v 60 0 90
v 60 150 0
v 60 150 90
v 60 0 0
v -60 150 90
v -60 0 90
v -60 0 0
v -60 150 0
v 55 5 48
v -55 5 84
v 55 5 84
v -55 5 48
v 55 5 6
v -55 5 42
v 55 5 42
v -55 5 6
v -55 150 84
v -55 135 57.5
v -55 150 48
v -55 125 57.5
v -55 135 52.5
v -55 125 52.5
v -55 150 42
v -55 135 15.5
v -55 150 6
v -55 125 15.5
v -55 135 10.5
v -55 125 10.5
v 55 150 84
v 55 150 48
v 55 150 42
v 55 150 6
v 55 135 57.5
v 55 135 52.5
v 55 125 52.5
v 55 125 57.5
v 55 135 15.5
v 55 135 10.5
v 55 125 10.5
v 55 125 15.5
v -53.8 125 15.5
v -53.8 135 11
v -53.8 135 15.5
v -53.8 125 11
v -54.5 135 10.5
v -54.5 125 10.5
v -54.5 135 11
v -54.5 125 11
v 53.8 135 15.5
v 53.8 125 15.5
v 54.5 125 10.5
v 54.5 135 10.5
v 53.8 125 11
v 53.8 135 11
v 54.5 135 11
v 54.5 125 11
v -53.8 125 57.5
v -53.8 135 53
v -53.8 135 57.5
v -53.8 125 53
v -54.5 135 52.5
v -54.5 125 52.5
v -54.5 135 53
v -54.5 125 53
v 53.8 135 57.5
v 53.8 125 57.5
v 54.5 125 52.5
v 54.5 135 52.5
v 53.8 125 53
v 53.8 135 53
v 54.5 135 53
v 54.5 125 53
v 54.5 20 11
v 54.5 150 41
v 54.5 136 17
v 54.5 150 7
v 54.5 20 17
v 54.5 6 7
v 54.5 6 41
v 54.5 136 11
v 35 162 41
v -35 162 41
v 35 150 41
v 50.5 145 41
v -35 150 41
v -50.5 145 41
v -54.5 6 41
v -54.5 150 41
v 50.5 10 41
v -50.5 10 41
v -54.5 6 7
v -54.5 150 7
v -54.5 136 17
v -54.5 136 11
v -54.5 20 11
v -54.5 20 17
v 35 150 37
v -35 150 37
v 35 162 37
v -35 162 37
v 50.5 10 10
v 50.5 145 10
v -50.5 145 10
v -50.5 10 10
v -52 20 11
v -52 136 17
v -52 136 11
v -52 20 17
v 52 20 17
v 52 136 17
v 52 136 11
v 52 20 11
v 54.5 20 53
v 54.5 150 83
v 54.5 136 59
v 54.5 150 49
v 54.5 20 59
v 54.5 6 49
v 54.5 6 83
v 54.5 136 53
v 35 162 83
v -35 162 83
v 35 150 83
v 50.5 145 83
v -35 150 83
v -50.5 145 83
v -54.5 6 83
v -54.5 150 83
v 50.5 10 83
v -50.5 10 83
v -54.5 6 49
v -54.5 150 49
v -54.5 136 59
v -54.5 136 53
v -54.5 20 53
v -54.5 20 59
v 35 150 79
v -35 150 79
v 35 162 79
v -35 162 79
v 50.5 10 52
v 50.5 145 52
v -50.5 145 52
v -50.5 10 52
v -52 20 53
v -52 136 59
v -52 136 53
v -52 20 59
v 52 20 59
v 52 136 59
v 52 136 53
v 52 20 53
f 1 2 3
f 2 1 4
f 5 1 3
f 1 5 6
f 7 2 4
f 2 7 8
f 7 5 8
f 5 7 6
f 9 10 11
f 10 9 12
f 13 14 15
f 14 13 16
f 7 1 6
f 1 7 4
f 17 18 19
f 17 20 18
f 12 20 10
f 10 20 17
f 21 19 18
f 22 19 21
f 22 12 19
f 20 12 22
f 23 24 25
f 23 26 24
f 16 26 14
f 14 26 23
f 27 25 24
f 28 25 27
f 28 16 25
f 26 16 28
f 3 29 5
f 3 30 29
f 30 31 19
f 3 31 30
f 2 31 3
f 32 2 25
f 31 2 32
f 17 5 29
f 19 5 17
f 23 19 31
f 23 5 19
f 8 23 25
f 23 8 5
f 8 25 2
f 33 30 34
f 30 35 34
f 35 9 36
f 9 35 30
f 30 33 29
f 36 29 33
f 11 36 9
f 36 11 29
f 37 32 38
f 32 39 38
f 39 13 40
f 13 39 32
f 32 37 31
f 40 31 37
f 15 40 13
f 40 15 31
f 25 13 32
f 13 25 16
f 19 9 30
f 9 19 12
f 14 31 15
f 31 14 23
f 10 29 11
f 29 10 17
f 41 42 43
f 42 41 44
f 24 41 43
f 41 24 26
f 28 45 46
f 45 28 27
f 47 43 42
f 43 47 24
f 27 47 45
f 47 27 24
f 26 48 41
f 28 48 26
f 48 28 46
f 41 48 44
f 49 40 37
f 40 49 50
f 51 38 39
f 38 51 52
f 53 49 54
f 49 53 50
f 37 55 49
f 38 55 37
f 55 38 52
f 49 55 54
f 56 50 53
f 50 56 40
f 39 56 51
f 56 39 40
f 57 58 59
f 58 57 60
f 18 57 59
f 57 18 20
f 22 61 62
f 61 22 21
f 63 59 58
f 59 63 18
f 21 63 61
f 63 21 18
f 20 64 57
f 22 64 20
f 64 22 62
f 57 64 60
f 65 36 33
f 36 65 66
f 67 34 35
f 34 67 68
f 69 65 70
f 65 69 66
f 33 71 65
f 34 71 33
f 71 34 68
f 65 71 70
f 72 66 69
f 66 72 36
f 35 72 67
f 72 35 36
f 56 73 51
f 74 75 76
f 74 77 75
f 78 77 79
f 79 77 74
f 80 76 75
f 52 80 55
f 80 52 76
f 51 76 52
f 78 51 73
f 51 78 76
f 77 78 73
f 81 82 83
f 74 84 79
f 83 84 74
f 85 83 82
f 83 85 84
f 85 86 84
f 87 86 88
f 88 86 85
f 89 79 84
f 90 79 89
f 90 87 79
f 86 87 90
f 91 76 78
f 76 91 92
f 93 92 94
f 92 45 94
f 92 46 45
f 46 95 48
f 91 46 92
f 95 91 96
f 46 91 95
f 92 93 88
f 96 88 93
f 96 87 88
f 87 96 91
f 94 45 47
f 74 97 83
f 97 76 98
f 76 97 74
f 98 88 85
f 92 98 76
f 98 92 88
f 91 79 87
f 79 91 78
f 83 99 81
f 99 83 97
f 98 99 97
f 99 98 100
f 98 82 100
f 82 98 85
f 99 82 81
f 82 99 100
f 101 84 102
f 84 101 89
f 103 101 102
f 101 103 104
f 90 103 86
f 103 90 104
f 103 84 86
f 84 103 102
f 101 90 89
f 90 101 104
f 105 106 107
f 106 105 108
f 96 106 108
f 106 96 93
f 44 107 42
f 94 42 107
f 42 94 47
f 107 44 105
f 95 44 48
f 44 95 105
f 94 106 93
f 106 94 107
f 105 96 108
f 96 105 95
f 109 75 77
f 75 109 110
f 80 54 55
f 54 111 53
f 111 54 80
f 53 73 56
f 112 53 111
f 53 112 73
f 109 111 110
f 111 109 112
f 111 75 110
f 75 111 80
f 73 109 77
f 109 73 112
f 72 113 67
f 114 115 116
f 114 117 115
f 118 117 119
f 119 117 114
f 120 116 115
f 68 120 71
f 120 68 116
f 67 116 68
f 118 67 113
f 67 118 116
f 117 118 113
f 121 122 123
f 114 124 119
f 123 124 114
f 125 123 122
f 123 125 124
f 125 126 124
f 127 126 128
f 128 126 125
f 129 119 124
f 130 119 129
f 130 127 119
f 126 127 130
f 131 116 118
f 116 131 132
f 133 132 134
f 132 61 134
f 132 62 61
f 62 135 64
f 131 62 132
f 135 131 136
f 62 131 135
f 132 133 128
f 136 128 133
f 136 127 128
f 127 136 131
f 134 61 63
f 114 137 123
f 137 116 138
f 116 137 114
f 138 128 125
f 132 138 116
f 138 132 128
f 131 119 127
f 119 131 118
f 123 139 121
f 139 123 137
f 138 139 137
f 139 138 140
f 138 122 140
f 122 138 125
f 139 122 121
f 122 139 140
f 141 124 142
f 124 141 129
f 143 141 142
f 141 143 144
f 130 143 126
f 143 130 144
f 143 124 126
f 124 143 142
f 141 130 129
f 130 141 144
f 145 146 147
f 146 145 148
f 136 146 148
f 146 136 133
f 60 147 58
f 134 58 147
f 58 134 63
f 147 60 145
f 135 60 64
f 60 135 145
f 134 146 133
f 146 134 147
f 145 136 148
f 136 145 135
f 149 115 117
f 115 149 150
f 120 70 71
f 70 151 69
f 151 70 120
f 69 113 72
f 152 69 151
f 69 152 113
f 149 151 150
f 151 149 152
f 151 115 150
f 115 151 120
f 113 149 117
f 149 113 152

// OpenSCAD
part = "assembly"; // [assembly:Assembly, frame:Frame, drawer:Drawer]
cadverify_only = "";
module instance(name, part, unit = 1) {
    echo(cadverify_instance = [name, part, unit]);
    if (cadverify_only == "" || cadverify_only == name) children();
}
// frame assembly coords: X -60..60, Y 0..150, Z 0..90
module frame_asm() {
    union() {
        translate([-60,0,0]) cube([120,5,90]);
        translate([-60,0,0]) cube([5,150,90]);
        translate([55,0,0]) cube([5,150,90]);
        translate([-55,5,0]) cube([110,145,6]);
        translate([-55,5,42]) cube([110,145,6]);
        translate([-55,5,84]) cube([110,145,6]);
        translate([-55,125,10.5]) cube([1.2,10,5]);
        translate([53.8,125,10.5]) cube([1.2,10,5]);
        translate([-55,125,52.5]) cube([1.2,10,5]);
        translate([53.8,125,52.5]) cube([1.2,10,5]);
    }
}
module frame_print() {
    translate([0,90,0]) rotate([90,0,0]) frame_asm();
}
// drawer part coords: X -54.5..54.5, Y 0..144 body + handle to 156, Z 0..34
module drawer_raw() {
    difference() {
        union() {
            translate([-54.5,0,0]) cube([109,144,34]);
            // handle tip block
            translate([-35,144,30]) cube([70,12,4]);
            // handle wedge (triangular prism)
            polyhedron(points=[[-35,144,18],[-35,144,30],[-35,156,30],[-35,144,18],[35,144,18],[35,144,30],[35,156,30],[-35,156,30],[35,144,18],[35,156,30]], faces=[[0,1,2],[5,4,3],[0,4,5,1],[1,5,6,2],[2,6,7],[7,6,5],[0,2,7,3],[3,7,6,4]]);
        }
        translate([-50.5,4,3]) cube([101,135,32]);
        translate([-54.5,14,4]) cube([2.5,116,6]);
        translate([52,14,4]) cube([2.5,116,6]);
    }
}
module drawer_part() { drawer_raw(); }
module frame_spec() {
    echo(cadverify_spec = [
        ["bounds", [[-60,0,0],[60,90,150]]],
        ["bodies", 1],
        ["through_holes", 0],
        ["support_faces", [["bed","-z",5000]]],
        ["overhangs_allowed", [
            ["stop tab underside, bridge 2.4mm", [[-55,74.5,124],[-53.8,79.5,126]]],
            ["stop tab underside, bridge 2.4mm", [[53.8,74.5,124],[55,79.5,126]]],
            ["stop tab underside, bridge 2.4mm", [[-55,32.5,124],[-53.8,37.5,126]]],
            ["stop tab underside, bridge 2.4mm", [[53.8,32.5,124],[55,37.5,126]]]
        ]],
        ["copies", 1],
        ["details", [
            ["back_panel","material",[[-60,0,0],[60,90,5]],0.9],
            ["stop_tab_ll","material",[[-55,74.5,125],[-53.8,79.5,135]],0.9],
            ["stop_tab_lr","material",[[53.8,74.5,125],[55,79.5,135]],0.9],
            ["stop_tab_ul","material",[[-55,32.5,125],[-53.8,37.5,135]],0.9],
            ["stop_tab_ur","material",[[53.8,32.5,125],[55,37.5,135]],0.9],
            ["lower_cavity","void",[[-55,48,5],[55,84,150]],0.9],
            ["upper_cavity","void",[[-55,6,5],[55,42,150]],0.9],
            ["back","thickness",[0,10,-1],[0,0,1],5]
        ]]
    ]);
}
module drawer_spec() {
    echo(cadverify_spec = [
        ["bounds", [[-54.5,0,0],[54.5,156,34]]],
        ["bodies", 1],
        ["through_holes", 0],
        ["support_faces", [["bed","-z",10000]]],
        ["overhangs_allowed", [
            ["drawer slide groove ceiling, bridge 5mm", [[-54.5,14,9],[-52,130,11]]],
            ["drawer slide groove ceiling, bridge 5mm", [[52,14,9],[54.5,130,11]]]
        ]],
        ["copies", 2],
        ["details", [
            ["pull_tip","material",[[-35,150,30],[35,156,34]],0.9],
            ["groove_left","void",[[-54.5,14,4],[-52,130,10]],0.9],
            ["groove_right","void",[[52,14,4],[54.5,130,10]],0.9],
            ["drawer_cavity","void",[[-50.5,4,3],[50.5,139,34]],0.9],
            ["bottom","thickness",[0,70,-1],[0,0,1],3],
            ["side_walls","thickness",[-55.5,70,20],[1,0,0],8],
            ["pull_shape","view",[[-35,144,18],[35,156,34]]]
        ]]
    ]);
}
module assembly_spec() {
    echo(cadverify_spec = [
        ["bounds", [[-60,0,0],[60,162,90]]],
        ["support_faces", [["base","-z",5000]]],
        ["allowed_interferences", []],
        ["motions", [
            ["drawer_lower_slide", ["drawer_lower"], "slide", [0,1,0], [0,105], ["stops", [0,105]]],
            ["drawer_upper_slide", ["drawer_upper"], "slide", [0,1,0], [0,105], ["stops", [0,105]]]
        ]],
        ["assembly_order", [
            [["frame"], [0,0,0]],
            [["drawer_lower"], [0,-1,0], ["flex", [["drawer_lower","frame",0.7,"stop tabs snap into grooves"]]]],
            [["drawer_upper"], [0,-1,0], ["flex", [["drawer_upper","frame",0.7,"stop tabs snap into grooves"]]]]
        ]]
    ]);
}
if (part == "frame") { frame_spec(); frame_print(); }
else if (part == "drawer") { drawer_spec(); drawer_part(); }
else if (part == "assembly") {
    assembly_spec();
    instance("frame","frame",1) frame_asm();
    instance("drawer_lower","drawer",1) translate([0,6,7]) drawer_raw();
    instance("drawer_upper","drawer",1) translate([0,6,49]) drawer_raw();
}
